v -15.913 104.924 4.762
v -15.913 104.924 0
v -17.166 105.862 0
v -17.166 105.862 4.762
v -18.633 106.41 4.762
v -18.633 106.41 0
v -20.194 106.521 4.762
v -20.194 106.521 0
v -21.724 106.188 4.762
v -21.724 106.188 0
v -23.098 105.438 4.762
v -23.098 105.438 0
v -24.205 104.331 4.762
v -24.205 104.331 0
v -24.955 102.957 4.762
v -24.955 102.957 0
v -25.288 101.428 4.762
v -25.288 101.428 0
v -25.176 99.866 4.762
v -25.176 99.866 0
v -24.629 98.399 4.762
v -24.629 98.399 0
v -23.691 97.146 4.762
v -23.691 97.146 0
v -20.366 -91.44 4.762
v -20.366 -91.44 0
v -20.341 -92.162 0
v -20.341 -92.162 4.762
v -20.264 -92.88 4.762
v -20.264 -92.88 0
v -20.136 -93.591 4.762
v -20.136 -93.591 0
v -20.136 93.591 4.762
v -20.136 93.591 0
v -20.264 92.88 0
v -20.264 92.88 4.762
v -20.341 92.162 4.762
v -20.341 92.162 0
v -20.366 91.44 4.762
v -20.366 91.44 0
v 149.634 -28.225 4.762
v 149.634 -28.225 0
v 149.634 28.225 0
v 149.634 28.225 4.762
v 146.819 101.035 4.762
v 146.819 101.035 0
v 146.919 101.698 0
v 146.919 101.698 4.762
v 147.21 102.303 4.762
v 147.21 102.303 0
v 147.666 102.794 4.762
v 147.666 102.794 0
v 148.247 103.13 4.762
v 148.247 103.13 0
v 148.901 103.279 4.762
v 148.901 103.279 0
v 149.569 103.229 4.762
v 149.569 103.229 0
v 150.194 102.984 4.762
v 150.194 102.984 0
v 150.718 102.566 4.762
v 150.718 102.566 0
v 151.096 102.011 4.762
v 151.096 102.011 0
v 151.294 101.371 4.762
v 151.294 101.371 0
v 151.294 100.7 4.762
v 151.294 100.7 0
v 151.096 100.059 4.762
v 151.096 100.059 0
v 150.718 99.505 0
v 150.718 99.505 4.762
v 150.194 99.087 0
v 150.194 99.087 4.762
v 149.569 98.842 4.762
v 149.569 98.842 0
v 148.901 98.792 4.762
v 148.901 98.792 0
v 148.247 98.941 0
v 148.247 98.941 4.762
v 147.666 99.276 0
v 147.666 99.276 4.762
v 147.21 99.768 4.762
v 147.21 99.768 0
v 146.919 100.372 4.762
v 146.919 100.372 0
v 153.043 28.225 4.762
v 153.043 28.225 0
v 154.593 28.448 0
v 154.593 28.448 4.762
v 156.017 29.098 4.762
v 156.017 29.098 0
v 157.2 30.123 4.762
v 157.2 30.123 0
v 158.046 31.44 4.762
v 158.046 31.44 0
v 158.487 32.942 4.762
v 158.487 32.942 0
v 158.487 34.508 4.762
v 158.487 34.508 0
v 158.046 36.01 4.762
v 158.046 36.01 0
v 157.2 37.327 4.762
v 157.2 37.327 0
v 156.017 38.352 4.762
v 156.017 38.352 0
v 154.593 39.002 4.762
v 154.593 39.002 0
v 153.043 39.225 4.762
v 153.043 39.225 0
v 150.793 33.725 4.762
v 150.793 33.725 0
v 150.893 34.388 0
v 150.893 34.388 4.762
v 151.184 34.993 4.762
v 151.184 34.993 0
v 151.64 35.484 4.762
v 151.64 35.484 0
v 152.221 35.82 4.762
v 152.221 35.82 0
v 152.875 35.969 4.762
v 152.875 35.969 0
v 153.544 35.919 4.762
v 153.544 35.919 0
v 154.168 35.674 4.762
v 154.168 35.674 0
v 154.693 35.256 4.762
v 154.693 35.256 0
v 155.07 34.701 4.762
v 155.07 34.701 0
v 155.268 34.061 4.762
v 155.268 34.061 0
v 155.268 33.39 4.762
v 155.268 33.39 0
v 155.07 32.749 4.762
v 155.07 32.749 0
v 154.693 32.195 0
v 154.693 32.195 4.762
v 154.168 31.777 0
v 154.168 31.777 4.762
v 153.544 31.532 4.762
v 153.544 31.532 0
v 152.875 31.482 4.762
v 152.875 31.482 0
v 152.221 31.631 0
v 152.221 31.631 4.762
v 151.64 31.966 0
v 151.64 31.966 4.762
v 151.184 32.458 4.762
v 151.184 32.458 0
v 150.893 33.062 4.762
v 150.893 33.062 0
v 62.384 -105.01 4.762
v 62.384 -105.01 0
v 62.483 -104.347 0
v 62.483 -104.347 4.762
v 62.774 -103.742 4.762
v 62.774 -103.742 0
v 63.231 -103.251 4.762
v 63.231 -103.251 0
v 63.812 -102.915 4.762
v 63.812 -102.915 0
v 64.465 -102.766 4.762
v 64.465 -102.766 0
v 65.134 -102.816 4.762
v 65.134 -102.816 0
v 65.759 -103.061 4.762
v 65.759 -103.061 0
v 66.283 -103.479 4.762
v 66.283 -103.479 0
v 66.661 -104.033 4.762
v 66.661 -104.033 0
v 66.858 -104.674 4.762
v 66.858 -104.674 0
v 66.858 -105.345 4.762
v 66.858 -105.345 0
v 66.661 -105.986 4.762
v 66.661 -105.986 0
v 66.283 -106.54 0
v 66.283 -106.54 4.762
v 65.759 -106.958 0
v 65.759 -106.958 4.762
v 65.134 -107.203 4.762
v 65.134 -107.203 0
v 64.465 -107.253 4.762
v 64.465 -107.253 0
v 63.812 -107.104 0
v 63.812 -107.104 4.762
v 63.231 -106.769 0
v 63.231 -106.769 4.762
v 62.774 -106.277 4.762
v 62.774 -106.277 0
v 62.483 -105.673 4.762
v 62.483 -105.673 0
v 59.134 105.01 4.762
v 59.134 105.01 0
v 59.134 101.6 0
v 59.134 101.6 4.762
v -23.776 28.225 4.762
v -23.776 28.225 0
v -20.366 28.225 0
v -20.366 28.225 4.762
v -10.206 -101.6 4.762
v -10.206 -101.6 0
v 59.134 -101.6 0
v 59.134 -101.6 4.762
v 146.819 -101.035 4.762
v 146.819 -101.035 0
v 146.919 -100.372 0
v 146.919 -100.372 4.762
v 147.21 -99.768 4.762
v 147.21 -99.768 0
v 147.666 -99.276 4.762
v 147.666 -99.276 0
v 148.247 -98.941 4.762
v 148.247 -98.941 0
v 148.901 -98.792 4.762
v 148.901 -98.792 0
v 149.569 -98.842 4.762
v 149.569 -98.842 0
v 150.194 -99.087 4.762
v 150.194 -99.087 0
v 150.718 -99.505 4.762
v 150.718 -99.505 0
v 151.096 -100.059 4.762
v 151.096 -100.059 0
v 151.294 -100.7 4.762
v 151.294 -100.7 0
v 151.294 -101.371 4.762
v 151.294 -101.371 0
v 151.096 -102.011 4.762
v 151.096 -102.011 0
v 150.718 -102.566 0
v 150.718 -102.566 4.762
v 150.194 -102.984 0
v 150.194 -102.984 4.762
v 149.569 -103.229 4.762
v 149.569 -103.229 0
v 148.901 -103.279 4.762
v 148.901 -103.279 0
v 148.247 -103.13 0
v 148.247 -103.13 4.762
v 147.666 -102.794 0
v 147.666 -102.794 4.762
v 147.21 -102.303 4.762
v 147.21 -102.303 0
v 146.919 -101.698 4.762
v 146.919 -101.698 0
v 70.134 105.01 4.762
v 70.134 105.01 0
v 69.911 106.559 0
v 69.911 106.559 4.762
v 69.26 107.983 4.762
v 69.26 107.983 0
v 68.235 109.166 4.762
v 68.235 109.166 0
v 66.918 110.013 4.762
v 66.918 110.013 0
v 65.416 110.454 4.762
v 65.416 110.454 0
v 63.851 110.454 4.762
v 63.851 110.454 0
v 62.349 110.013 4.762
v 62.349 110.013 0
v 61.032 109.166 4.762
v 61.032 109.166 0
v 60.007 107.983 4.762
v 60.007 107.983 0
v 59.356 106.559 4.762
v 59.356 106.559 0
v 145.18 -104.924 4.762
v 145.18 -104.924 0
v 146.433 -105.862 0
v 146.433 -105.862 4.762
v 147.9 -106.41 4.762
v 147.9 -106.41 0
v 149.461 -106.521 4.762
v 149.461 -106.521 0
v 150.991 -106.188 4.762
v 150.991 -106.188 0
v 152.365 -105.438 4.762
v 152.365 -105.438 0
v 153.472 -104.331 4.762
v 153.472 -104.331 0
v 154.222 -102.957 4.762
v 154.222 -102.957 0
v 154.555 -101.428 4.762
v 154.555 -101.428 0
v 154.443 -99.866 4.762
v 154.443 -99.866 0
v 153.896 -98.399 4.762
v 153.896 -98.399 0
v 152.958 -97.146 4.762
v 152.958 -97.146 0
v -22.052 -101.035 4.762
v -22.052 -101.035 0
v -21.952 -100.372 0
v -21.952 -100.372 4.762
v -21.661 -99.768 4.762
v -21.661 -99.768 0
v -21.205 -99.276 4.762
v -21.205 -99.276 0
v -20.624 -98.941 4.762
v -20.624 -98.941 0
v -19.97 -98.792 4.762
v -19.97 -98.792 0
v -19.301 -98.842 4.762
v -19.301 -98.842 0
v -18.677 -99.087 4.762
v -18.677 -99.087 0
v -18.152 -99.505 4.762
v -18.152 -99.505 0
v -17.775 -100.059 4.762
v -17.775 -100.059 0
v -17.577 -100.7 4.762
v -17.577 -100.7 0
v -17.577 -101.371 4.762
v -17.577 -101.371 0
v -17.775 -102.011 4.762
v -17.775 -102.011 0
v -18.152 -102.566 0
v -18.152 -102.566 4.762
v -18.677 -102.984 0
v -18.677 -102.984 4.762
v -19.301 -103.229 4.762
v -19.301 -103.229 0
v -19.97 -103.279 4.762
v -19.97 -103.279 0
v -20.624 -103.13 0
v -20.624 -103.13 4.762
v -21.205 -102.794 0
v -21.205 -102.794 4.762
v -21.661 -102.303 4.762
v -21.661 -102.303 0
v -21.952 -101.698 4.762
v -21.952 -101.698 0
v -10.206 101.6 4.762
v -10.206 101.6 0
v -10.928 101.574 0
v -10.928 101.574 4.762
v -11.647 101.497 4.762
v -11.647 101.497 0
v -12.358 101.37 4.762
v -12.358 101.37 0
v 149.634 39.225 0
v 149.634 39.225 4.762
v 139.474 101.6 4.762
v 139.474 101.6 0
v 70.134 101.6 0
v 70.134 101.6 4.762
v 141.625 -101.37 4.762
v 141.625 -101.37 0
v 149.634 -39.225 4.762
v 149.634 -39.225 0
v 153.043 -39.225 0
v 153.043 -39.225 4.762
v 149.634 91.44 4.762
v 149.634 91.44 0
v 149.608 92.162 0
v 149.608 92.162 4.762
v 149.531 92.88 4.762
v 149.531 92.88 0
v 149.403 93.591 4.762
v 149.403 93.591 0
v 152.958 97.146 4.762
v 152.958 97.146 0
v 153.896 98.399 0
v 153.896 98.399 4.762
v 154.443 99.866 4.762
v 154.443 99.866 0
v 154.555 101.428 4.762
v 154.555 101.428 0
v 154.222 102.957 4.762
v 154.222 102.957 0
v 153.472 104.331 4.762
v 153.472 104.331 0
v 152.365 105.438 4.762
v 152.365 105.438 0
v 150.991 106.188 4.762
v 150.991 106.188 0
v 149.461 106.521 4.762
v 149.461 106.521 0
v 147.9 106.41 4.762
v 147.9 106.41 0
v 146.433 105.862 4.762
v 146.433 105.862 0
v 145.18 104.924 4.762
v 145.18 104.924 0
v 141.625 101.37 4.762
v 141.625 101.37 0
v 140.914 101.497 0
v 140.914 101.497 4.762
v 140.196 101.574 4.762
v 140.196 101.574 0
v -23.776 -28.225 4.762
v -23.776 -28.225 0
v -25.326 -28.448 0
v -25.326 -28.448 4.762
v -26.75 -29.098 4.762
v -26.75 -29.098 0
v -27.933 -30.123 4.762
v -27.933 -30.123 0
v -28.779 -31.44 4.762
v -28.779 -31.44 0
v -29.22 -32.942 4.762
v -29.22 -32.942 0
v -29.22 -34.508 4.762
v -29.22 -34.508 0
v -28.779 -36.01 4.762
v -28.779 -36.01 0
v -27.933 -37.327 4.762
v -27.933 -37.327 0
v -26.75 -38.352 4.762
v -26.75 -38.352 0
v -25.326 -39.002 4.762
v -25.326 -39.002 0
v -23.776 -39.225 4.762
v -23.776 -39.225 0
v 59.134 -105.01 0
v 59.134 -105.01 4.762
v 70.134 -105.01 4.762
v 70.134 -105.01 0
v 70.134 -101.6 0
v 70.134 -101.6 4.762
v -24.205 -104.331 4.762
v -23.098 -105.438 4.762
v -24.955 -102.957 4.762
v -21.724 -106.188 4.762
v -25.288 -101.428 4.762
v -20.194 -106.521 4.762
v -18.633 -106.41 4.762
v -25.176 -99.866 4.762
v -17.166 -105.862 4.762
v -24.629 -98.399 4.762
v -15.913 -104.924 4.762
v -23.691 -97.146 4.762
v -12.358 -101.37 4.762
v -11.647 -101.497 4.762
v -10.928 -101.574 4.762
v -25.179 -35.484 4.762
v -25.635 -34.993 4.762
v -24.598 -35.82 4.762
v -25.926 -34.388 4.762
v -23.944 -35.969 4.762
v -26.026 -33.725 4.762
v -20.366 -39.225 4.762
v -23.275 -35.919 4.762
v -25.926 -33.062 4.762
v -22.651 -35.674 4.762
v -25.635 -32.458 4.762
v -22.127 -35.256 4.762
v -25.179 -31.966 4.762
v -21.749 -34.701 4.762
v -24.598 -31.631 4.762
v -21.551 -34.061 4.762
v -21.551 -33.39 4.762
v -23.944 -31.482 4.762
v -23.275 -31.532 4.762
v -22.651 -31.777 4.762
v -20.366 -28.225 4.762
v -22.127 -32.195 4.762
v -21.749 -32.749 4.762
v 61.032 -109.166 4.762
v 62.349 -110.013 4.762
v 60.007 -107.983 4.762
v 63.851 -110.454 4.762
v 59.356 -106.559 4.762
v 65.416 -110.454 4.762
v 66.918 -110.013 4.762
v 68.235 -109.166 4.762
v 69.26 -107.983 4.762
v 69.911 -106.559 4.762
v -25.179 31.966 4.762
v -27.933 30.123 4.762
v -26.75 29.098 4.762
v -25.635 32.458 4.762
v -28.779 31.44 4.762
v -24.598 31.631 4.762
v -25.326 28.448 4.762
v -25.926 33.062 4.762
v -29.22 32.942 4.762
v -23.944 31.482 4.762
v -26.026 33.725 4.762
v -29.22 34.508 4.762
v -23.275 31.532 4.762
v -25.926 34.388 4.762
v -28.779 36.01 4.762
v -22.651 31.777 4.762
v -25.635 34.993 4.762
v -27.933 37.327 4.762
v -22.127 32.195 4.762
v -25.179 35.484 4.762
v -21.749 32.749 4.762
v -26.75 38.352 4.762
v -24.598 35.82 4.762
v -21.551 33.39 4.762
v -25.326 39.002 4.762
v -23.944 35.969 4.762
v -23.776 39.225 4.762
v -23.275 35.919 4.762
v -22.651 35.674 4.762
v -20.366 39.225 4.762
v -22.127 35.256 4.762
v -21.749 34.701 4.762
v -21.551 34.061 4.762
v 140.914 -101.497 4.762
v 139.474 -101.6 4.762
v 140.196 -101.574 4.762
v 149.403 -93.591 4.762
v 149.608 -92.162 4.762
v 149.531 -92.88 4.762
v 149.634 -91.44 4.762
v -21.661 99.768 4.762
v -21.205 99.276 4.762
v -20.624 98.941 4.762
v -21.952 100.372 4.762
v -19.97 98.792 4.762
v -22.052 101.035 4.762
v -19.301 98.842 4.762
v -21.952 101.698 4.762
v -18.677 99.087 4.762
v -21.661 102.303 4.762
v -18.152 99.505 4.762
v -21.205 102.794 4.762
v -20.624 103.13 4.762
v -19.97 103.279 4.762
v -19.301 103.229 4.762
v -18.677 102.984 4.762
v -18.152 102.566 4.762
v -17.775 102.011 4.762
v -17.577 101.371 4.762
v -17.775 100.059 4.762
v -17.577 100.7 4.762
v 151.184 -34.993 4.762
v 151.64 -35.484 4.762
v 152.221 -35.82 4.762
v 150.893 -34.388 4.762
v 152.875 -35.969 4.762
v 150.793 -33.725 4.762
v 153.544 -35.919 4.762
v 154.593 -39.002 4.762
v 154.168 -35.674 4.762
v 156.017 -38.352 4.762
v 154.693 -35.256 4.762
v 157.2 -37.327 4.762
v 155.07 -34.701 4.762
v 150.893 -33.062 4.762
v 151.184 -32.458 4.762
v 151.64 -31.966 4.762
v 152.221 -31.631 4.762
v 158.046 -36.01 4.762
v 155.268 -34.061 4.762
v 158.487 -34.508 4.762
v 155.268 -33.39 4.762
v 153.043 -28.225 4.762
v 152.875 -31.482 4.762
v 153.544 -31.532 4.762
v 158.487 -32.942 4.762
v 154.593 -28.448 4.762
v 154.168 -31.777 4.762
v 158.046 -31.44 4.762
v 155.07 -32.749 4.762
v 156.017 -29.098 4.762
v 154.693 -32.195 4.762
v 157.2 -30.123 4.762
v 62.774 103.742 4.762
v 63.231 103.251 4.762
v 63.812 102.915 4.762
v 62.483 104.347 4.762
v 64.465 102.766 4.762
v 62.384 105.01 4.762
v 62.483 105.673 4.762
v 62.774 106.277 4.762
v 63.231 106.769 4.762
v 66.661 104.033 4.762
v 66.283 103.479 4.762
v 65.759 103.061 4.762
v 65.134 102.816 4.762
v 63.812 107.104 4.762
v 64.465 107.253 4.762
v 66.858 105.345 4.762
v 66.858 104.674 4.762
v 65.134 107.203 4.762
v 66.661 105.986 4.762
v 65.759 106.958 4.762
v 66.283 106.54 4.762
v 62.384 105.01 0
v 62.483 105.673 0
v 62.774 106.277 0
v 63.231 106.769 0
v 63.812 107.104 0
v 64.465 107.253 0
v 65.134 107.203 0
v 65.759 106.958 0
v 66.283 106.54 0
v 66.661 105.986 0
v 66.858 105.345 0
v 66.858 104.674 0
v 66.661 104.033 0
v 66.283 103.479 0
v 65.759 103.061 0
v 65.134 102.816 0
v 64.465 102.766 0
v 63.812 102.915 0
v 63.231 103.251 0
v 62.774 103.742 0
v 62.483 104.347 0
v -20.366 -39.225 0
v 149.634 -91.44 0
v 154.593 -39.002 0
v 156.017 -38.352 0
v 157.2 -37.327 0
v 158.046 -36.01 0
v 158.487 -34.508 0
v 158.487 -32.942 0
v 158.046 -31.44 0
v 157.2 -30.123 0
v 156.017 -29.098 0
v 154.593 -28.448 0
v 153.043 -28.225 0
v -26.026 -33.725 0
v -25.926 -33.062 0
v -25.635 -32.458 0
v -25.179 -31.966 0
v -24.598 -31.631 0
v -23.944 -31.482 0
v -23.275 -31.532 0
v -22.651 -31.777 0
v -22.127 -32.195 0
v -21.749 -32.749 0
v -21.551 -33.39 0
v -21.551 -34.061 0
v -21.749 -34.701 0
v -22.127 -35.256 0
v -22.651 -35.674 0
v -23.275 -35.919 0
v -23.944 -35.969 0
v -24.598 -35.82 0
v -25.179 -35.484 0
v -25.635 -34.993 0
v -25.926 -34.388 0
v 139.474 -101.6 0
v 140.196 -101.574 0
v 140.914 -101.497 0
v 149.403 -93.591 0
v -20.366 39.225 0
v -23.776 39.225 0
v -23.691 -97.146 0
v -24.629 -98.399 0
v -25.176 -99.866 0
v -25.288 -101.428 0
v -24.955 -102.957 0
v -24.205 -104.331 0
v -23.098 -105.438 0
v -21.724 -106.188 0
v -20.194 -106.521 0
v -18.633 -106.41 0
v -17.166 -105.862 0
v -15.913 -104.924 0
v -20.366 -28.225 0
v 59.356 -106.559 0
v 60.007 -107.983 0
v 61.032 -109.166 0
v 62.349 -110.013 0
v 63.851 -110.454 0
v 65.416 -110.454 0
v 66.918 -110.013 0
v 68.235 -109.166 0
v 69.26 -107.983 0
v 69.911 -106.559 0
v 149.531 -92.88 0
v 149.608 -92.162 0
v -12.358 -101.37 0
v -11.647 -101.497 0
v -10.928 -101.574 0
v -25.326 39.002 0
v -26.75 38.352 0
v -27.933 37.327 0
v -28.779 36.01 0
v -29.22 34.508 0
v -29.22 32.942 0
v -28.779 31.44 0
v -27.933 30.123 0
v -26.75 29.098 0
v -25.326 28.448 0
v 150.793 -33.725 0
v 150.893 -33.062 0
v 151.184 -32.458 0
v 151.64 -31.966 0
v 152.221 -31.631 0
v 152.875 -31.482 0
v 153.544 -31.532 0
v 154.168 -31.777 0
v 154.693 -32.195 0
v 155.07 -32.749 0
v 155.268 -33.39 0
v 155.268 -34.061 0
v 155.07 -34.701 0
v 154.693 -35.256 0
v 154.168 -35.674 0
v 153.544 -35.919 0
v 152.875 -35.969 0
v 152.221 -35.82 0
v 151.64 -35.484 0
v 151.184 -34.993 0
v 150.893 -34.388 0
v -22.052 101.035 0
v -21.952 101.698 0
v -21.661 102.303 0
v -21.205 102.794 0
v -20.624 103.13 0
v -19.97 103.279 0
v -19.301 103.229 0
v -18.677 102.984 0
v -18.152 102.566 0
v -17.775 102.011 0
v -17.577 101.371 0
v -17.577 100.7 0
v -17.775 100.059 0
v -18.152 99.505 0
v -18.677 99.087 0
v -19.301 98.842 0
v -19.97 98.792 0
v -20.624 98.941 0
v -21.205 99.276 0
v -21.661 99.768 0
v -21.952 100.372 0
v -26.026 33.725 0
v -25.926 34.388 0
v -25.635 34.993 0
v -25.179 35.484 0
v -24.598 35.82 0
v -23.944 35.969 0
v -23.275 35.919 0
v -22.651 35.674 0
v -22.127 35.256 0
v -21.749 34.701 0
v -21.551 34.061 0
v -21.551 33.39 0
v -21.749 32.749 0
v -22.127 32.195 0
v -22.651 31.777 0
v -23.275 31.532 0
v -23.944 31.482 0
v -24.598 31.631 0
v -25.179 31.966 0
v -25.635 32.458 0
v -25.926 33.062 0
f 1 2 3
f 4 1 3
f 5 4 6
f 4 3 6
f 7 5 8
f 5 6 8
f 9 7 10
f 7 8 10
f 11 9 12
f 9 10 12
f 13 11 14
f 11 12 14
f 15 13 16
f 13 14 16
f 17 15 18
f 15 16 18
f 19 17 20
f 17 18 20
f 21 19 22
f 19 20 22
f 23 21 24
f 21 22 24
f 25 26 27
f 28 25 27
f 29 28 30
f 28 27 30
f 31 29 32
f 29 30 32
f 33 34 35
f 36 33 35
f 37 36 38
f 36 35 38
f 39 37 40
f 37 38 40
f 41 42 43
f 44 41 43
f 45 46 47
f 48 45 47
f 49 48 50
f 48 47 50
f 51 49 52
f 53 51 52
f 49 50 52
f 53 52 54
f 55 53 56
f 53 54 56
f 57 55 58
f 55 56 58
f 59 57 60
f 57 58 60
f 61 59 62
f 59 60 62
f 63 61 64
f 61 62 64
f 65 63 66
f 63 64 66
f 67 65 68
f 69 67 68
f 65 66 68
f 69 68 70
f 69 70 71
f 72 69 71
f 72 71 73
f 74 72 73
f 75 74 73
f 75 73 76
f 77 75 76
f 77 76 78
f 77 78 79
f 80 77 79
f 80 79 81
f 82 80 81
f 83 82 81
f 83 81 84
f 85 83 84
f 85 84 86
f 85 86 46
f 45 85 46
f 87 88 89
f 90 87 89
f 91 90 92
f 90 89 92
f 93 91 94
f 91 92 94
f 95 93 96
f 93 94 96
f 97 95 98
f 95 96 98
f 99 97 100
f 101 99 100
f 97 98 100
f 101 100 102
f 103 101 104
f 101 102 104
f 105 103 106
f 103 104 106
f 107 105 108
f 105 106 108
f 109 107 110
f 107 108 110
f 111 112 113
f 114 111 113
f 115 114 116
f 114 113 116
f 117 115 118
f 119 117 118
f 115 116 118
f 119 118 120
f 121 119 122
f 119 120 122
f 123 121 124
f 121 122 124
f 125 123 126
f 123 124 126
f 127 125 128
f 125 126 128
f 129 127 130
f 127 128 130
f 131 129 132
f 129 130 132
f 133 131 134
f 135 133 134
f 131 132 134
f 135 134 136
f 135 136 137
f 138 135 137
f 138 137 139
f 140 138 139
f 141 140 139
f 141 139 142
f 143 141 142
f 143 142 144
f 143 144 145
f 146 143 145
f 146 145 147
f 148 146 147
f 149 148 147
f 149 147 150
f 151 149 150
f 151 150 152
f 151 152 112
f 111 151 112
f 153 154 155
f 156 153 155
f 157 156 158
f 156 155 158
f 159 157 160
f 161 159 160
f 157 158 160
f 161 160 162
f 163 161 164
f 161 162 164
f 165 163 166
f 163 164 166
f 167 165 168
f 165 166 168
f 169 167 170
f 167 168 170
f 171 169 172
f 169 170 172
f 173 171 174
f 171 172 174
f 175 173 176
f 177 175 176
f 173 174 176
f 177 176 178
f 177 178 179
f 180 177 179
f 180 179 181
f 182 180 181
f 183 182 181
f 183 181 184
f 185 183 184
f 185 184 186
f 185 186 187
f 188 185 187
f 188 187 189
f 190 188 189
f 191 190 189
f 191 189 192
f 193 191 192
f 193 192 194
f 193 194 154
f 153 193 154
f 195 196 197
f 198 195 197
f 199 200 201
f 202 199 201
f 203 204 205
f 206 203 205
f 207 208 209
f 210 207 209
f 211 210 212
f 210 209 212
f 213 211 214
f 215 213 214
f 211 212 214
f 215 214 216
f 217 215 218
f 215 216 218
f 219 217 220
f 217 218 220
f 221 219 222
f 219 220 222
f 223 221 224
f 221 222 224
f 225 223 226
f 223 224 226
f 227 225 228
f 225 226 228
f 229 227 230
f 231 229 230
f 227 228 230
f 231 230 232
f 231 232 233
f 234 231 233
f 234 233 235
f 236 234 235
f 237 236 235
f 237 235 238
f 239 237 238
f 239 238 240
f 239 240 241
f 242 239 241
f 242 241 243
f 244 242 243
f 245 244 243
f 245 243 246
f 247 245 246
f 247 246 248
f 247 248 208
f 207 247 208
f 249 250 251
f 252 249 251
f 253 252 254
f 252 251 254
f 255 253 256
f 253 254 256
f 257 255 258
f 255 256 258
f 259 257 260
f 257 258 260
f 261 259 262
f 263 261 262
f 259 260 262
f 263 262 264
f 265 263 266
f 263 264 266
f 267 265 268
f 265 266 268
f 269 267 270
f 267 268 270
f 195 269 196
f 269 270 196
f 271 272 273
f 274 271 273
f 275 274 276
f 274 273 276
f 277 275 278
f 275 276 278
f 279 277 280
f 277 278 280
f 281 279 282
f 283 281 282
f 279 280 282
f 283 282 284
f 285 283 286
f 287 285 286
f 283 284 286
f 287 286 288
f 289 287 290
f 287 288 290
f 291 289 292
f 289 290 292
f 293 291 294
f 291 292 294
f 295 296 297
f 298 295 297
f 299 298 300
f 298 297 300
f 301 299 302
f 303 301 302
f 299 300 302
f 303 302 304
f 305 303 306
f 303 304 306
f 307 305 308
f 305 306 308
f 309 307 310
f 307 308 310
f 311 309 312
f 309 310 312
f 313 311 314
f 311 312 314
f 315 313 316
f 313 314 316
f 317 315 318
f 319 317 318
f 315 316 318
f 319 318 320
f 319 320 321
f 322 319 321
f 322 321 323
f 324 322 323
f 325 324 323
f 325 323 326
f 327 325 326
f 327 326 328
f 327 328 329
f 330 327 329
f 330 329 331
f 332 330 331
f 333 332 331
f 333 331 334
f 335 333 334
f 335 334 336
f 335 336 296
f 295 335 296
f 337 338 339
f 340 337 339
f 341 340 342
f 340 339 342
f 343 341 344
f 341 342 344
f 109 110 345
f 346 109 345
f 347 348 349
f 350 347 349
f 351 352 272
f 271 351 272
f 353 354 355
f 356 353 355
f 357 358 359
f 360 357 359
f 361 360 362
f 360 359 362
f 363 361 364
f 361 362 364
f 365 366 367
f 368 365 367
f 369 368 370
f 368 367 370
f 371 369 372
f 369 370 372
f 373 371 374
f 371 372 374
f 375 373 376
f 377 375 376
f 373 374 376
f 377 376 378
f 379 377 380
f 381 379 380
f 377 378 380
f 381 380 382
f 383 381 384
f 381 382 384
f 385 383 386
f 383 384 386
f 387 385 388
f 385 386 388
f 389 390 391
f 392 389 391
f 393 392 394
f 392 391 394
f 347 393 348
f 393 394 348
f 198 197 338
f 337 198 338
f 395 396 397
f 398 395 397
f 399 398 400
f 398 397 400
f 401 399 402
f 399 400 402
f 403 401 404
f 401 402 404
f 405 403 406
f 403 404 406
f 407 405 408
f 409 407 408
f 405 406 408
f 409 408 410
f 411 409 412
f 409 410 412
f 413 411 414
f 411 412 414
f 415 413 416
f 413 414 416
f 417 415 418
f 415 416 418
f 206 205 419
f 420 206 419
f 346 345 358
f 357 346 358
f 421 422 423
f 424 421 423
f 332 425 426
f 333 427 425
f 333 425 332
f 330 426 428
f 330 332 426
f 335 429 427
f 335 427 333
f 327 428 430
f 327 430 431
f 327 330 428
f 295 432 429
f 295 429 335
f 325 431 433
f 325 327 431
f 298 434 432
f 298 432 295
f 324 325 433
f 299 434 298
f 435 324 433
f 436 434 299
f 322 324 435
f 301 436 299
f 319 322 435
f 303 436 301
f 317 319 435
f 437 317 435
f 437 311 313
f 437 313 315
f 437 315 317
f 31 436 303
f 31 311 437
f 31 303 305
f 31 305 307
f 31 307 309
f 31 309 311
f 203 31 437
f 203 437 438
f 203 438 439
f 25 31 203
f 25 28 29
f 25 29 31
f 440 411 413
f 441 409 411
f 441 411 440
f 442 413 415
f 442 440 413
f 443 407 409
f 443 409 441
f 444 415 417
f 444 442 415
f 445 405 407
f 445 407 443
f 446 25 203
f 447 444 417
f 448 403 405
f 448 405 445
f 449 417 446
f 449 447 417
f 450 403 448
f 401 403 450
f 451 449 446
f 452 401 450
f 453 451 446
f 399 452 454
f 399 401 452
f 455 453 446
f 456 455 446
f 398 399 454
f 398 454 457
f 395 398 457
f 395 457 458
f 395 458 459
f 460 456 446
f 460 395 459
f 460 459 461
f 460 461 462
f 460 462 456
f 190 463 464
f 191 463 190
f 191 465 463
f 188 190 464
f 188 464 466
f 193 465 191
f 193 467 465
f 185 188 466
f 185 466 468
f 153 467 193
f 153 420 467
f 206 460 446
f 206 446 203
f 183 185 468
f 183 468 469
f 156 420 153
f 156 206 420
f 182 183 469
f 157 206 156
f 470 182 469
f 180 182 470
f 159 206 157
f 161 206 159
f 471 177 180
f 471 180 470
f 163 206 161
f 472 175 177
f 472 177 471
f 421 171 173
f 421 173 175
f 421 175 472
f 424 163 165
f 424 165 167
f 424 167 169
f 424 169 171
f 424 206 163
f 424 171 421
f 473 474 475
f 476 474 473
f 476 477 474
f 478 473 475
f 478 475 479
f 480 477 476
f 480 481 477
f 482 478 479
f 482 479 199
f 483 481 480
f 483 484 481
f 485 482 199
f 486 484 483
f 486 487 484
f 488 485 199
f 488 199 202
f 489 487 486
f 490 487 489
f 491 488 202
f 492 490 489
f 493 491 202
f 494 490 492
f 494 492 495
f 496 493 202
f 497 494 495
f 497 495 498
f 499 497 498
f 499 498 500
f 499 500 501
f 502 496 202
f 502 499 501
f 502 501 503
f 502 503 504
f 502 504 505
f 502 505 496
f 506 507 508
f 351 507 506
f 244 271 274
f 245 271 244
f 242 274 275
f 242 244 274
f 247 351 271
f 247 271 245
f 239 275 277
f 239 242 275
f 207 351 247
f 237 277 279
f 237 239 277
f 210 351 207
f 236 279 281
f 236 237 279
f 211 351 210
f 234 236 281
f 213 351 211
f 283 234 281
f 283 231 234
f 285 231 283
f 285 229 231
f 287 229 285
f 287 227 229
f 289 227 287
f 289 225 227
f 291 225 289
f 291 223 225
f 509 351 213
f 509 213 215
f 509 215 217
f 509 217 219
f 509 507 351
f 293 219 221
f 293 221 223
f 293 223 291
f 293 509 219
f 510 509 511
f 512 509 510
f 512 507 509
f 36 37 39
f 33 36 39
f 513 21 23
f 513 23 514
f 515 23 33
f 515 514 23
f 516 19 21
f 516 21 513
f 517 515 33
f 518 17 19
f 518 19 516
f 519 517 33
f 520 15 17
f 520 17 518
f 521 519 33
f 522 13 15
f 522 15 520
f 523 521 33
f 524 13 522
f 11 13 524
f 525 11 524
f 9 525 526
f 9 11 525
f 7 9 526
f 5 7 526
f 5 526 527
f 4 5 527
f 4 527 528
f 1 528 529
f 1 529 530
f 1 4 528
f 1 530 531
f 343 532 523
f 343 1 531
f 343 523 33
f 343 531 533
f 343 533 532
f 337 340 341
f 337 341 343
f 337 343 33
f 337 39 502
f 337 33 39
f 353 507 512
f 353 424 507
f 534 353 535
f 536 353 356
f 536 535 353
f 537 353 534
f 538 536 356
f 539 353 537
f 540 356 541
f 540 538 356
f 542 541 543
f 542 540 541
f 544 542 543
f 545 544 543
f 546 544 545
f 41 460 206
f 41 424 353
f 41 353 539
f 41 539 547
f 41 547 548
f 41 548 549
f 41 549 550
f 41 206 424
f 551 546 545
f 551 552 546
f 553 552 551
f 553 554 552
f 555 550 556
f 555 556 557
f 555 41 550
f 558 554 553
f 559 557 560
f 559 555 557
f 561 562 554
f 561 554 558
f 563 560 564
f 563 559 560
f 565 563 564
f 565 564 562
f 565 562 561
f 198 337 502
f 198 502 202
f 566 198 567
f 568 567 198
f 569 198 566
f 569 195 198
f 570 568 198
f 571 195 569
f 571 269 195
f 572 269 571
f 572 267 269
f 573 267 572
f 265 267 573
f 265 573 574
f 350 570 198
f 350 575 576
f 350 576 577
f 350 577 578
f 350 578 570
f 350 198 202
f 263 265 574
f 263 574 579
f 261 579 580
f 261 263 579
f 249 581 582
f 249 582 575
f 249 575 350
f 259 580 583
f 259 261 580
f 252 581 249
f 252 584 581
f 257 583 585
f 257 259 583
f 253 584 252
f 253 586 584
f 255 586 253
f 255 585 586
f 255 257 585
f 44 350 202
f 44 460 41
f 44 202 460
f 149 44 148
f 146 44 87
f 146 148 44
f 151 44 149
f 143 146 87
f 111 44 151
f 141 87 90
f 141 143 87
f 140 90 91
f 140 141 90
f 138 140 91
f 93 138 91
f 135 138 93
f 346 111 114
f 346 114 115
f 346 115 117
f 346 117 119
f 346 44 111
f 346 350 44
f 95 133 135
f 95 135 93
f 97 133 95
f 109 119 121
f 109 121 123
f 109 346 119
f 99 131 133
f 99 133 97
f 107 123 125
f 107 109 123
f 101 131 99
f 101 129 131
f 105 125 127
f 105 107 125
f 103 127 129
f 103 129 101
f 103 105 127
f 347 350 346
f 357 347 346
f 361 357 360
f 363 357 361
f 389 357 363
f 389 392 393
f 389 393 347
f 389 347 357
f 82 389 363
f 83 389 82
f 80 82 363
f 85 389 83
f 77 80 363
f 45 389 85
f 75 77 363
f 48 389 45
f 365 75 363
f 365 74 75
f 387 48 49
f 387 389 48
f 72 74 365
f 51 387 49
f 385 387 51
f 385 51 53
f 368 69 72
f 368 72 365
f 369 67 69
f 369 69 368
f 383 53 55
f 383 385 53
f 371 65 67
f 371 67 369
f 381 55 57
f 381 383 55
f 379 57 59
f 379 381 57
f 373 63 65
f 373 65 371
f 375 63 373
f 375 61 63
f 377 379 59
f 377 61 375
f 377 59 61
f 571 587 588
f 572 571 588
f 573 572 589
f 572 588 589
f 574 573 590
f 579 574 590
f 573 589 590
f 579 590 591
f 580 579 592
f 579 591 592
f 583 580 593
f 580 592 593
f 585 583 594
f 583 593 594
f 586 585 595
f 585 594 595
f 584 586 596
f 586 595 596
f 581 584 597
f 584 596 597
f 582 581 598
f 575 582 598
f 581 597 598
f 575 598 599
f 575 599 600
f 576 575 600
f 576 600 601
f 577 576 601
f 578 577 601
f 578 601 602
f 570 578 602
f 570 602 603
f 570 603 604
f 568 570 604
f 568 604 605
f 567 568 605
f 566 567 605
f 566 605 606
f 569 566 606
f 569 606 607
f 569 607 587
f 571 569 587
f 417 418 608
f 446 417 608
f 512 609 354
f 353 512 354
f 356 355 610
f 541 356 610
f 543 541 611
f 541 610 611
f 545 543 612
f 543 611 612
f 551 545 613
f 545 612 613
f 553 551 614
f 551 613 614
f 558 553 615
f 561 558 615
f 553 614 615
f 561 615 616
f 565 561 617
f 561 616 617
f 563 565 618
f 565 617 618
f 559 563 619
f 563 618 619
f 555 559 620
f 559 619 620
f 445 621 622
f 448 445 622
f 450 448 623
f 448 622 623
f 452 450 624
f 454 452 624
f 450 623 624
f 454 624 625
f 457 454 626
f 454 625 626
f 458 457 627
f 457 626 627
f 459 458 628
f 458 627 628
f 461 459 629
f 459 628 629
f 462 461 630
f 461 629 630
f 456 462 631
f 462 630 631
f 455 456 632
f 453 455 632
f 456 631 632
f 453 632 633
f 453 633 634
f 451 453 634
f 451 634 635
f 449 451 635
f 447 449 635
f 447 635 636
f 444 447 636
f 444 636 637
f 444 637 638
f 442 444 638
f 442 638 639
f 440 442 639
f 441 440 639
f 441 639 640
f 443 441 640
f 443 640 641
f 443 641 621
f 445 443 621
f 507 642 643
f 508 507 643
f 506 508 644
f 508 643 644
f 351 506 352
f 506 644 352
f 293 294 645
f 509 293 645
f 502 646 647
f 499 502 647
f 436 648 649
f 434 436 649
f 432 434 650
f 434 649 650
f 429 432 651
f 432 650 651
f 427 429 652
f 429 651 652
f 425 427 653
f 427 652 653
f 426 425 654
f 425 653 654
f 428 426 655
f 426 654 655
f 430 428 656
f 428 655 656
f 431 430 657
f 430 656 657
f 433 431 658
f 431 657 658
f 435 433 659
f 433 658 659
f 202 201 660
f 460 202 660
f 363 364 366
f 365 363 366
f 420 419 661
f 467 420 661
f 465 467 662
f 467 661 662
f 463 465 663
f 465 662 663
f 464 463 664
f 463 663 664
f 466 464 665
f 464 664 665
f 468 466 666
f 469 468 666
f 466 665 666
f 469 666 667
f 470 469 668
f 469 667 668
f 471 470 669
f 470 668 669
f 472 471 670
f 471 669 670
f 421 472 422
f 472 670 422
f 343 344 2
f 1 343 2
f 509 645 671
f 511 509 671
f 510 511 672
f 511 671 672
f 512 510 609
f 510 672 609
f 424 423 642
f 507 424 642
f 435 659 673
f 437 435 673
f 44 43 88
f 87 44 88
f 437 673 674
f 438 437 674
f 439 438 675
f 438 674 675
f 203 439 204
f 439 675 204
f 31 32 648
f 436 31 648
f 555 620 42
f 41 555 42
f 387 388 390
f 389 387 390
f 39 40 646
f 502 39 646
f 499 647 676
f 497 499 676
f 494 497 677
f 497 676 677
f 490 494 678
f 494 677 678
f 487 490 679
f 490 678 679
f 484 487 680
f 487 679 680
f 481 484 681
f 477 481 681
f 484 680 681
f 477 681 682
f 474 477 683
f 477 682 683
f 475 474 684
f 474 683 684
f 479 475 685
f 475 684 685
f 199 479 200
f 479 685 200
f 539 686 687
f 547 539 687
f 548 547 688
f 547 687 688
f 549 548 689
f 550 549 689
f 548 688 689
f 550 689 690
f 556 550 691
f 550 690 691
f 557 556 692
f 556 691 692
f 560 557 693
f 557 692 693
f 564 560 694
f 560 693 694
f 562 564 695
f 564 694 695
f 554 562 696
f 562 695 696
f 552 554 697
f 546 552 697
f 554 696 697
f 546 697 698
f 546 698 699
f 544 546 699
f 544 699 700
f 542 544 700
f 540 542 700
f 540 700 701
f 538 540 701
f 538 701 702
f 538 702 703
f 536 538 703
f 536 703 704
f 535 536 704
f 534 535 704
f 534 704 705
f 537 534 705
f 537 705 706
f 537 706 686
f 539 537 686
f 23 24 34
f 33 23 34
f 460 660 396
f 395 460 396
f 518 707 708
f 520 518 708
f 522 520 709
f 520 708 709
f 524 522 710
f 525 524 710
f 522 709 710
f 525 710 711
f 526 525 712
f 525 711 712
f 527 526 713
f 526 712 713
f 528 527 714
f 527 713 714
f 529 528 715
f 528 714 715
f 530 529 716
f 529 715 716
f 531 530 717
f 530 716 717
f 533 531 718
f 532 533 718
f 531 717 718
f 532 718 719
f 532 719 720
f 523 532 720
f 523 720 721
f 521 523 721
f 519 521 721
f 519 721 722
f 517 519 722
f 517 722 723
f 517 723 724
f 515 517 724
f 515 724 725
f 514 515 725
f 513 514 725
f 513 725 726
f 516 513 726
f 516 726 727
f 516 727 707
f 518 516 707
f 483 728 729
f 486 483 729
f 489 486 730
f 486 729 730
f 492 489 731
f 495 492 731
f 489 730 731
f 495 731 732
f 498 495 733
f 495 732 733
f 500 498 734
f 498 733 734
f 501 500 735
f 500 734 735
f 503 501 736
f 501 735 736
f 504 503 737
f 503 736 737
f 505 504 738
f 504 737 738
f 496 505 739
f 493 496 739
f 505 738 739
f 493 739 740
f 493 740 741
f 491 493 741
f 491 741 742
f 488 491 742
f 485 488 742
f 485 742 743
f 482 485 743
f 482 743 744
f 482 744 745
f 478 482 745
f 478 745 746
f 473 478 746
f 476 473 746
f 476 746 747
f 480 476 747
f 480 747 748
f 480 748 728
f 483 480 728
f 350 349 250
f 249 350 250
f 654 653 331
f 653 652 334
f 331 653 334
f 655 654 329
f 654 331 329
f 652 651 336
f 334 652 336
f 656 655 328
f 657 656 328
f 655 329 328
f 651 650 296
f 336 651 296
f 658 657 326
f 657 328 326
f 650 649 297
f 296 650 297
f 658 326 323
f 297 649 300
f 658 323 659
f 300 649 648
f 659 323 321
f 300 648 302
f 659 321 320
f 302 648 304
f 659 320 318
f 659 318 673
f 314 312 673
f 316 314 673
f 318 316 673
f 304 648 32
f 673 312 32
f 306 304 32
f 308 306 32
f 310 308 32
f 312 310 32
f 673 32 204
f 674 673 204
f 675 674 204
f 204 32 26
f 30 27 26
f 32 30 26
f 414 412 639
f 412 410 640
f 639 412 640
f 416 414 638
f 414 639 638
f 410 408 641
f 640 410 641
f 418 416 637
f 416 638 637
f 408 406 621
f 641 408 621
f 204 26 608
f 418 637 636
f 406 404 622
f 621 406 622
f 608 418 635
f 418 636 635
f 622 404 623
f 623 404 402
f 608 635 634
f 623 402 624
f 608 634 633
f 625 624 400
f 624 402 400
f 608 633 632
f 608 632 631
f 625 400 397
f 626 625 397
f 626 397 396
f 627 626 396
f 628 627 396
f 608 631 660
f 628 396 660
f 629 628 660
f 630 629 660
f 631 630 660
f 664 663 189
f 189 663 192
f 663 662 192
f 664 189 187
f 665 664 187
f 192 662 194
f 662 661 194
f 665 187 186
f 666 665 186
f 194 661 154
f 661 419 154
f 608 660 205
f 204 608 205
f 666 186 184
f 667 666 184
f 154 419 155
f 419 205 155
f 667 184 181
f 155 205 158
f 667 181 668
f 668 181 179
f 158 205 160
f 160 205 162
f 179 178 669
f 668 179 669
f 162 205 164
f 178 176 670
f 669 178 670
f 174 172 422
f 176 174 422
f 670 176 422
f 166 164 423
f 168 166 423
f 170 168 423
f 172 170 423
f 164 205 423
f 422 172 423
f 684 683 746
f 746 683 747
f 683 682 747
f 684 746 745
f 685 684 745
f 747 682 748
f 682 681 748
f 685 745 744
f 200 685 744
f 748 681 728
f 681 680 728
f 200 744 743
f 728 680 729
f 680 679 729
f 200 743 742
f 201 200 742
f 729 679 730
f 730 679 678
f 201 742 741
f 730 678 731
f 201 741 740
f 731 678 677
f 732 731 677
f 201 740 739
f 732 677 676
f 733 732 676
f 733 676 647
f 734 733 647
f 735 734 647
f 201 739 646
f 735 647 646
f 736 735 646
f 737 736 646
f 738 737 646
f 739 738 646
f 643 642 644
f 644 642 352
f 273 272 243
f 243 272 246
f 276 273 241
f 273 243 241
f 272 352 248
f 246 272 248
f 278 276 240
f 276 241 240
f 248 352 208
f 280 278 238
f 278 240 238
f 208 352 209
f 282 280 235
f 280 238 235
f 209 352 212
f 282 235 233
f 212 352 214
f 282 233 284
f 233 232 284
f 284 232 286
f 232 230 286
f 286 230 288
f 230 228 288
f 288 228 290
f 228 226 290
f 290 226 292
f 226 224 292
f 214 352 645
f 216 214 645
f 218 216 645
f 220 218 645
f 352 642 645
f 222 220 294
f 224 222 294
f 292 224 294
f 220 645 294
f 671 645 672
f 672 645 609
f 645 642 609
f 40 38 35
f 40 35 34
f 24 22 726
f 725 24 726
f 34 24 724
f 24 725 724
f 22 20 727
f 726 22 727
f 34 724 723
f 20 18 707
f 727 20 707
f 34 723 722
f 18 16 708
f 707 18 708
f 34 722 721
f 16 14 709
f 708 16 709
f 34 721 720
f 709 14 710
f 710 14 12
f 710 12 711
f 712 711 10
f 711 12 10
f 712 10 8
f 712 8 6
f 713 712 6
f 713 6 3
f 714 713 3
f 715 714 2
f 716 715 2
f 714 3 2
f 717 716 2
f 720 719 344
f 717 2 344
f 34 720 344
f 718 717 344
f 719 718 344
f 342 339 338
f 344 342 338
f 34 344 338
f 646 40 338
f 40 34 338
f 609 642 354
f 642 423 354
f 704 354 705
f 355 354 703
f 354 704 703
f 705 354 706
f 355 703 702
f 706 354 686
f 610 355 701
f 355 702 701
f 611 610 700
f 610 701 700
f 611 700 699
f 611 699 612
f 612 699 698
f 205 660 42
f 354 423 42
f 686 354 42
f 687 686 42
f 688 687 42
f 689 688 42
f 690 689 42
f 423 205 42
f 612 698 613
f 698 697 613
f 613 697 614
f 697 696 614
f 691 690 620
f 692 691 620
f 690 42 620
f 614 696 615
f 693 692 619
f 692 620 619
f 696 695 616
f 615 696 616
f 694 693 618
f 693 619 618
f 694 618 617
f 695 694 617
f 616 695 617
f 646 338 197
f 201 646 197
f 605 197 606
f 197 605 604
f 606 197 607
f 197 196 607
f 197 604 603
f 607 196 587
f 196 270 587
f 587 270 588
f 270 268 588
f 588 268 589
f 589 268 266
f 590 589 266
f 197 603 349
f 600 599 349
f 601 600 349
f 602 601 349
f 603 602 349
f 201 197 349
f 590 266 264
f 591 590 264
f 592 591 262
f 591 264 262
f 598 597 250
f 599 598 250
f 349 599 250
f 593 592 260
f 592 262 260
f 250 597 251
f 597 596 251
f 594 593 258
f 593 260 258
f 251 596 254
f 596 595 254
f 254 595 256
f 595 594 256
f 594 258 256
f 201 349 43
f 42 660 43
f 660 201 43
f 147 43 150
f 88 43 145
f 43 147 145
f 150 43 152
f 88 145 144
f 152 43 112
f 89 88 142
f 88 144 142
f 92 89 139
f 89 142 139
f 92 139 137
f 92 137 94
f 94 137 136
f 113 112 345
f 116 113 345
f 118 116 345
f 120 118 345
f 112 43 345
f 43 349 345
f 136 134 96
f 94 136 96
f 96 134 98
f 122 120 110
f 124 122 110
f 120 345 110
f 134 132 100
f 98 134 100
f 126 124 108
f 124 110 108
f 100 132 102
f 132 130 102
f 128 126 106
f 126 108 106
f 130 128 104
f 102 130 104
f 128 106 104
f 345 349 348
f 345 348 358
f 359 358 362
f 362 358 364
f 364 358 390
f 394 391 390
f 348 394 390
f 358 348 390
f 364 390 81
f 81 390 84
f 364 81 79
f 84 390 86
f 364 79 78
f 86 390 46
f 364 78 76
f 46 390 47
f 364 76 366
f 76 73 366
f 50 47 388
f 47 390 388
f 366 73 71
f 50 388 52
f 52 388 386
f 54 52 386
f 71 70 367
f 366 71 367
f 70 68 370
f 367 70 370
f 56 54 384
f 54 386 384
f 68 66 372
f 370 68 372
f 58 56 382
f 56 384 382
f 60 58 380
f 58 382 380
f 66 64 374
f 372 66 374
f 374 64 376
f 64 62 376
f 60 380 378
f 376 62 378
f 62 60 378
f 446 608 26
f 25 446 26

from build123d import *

# Parameters (mm, degrees)
BOSS_EXTRUDE1_DEPTH  = 4.7625
M4_CLEARANCE_HOLE1_D = 4.5


with BuildPart() as part:
    # Sketch1 → Boss-Extrude1 (new body)
    with BuildSketch(Plane.XY):
        with BuildLine():
            Line((139.473530069, 101.6), (70.133530069, 101.6))
            Line((70.133530069, 101.6), (70.133530069, 105.0097))
            ThreePointArc((70.133530069, 105.0097), (64.633530069, 110.5097), (59.133530069, 105.0097))
            Line((59.133530069, 105.0097), (59.133530069, 101.6))
            Line((59.133530069, 101.6), (-10.206469931, 101.6))
            ThreePointArc((-10.206469931, 101.6), (-11.288333767, 101.542235923), (-12.357895857, 101.36960052))
            Line((-12.357895857, 101.36960052), (-15.912609523, 104.924314185))
            ThreePointArc((-15.912609523, 104.924314185), (-23.690784116, 104.924314185), (-23.690784116, 97.146139592))
            Line((-23.690784116, 97.146139592), (-20.13607045, 93.591425927))
            ThreePointArc((-20.13607045, 93.591425927), (-20.308705854, 92.521863836), (-20.366469931, 91.44))
            Line((-20.366469931, 91.44), (-20.366469931, 39.225226889))
            Line((-20.366469931, 39.225226889), (-23.776169931, 39.225226889))
            ThreePointArc((-23.776169931, 39.225226889), (-29.276169931, 33.725226889), (-23.776169931, 28.225226889))
            Line((-23.776169931, 28.225226889), (-20.366469931, 28.225226889))
            Line((-20.366469931, 28.225226889), (-20.366469931, -28.225226889))
            Line((-20.366469931, -28.225226889), (-23.776169931, -28.225226889))
            ThreePointArc((-23.776169931, -28.225226889), (-29.276169931, -33.725226889), (-23.776169931, -39.225226889))
            Line((-23.776169931, -39.225226889), (-20.366469931, -39.225226889))
            Line((-20.366469931, -39.225226889), (-20.366469931, -91.44))
            ThreePointArc((-20.366469931, -91.44), (-20.308705854, -92.521863836), (-20.13607045, -93.591425927))
            Line((-20.13607045, -93.591425927), (-23.690784116, -97.146139592))
            ThreePointArc((-23.690784116, -97.146139592), (-23.690784116, -104.924314185), (-15.912609523, -104.924314185))
            Line((-15.912609523, -104.924314185), (-12.357895857, -101.36960052))
            ThreePointArc((-12.357895857, -101.36960052), (-11.288333767, -101.542235923), (-10.206469931, -101.6))
            Line((-10.206469931, -101.6), (59.133530069, -101.6))
            Line((59.133530069, -101.6), (59.133530069, -105.0097))
            ThreePointArc((59.133530069, -105.0097), (64.633530069, -110.5097), (70.133530069, -105.0097))
            Line((70.133530069, -105.0097), (70.133530069, -101.6))
            Line((70.133530069, -101.6), (139.473530069, -101.6))
            ThreePointArc((139.473530069, -101.6), (140.555393905, -101.542235923), (141.624955996, -101.36960052))
            Line((141.624955996, -101.36960052), (145.179669661, -104.924314185))
            ThreePointArc((145.179669661, -104.924314185), (152.957844254, -104.924314185), (152.957844254, -97.146139592))
            Line((152.957844254, -97.146139592), (149.403130589, -93.591425927))
            ThreePointArc((149.403130589, -93.591425927), (149.575765992, -92.521863836), (149.633530069, -91.44))
            Line((149.633530069, -91.44), (149.633530069, -39.225226889))
            Line((149.633530069, -39.225226889), (153.043230069, -39.225226889))
            ThreePointArc((153.043230069, -39.225226889), (158.543230069, -33.725226889), (153.043230069, -28.225226889))
            Line((153.043230069, -28.225226889), (149.633530069, -28.225226889))
            Line((149.633530069, -28.225226889), (149.633530069, 28.225226889))
            Line((149.633530069, 28.225226889), (153.043230069, 28.225226889))
            ThreePointArc((153.043230069, 28.225226889), (158.543230069, 33.725226889), (153.043230069, 39.225226889))
            Line((153.043230069, 39.225226889), (149.633530069, 39.225226889))
            Line((149.633530069, 39.225226889), (149.633530069, 91.44))
            ThreePointArc((149.633530069, 91.44), (149.575765992, 92.521863836), (149.403130589, 93.591425927))
            Line((149.403130589, 93.591425927), (152.957844254, 97.146139592))
            ThreePointArc((152.957844254, 97.146139592), (152.957844254, 104.924314185), (145.179669661, 104.924314185))
            Line((145.179669661, 104.924314185), (141.624955996, 101.36960052))
            ThreePointArc((141.624955996, 101.36960052), (140.555393905, 101.542235923), (139.473530069, 101.6))
        make_face()
    extrude(amount=BOSS_EXTRUDE1_DEPTH)

    # M4 Clearance Hole1 (through all)
    with Locations(Plane.XY.offset(4.7625)):
        with Locations((-19.801696819, -101.035226889), (-23.776169931, -33.725226889), (-23.776169931, 33.725226889), (-19.801696819, 101.035226889), (64.633530069, 105.0097), (149.068756958, 101.035226889), (153.043230069, 33.725226889), (153.043230069, -33.725226889), (149.068756958, -101.035226889), (64.633530069, -105.0097)):
            Hole(M4_CLEARANCE_HOLE1_D / 2)


solid = part.part
